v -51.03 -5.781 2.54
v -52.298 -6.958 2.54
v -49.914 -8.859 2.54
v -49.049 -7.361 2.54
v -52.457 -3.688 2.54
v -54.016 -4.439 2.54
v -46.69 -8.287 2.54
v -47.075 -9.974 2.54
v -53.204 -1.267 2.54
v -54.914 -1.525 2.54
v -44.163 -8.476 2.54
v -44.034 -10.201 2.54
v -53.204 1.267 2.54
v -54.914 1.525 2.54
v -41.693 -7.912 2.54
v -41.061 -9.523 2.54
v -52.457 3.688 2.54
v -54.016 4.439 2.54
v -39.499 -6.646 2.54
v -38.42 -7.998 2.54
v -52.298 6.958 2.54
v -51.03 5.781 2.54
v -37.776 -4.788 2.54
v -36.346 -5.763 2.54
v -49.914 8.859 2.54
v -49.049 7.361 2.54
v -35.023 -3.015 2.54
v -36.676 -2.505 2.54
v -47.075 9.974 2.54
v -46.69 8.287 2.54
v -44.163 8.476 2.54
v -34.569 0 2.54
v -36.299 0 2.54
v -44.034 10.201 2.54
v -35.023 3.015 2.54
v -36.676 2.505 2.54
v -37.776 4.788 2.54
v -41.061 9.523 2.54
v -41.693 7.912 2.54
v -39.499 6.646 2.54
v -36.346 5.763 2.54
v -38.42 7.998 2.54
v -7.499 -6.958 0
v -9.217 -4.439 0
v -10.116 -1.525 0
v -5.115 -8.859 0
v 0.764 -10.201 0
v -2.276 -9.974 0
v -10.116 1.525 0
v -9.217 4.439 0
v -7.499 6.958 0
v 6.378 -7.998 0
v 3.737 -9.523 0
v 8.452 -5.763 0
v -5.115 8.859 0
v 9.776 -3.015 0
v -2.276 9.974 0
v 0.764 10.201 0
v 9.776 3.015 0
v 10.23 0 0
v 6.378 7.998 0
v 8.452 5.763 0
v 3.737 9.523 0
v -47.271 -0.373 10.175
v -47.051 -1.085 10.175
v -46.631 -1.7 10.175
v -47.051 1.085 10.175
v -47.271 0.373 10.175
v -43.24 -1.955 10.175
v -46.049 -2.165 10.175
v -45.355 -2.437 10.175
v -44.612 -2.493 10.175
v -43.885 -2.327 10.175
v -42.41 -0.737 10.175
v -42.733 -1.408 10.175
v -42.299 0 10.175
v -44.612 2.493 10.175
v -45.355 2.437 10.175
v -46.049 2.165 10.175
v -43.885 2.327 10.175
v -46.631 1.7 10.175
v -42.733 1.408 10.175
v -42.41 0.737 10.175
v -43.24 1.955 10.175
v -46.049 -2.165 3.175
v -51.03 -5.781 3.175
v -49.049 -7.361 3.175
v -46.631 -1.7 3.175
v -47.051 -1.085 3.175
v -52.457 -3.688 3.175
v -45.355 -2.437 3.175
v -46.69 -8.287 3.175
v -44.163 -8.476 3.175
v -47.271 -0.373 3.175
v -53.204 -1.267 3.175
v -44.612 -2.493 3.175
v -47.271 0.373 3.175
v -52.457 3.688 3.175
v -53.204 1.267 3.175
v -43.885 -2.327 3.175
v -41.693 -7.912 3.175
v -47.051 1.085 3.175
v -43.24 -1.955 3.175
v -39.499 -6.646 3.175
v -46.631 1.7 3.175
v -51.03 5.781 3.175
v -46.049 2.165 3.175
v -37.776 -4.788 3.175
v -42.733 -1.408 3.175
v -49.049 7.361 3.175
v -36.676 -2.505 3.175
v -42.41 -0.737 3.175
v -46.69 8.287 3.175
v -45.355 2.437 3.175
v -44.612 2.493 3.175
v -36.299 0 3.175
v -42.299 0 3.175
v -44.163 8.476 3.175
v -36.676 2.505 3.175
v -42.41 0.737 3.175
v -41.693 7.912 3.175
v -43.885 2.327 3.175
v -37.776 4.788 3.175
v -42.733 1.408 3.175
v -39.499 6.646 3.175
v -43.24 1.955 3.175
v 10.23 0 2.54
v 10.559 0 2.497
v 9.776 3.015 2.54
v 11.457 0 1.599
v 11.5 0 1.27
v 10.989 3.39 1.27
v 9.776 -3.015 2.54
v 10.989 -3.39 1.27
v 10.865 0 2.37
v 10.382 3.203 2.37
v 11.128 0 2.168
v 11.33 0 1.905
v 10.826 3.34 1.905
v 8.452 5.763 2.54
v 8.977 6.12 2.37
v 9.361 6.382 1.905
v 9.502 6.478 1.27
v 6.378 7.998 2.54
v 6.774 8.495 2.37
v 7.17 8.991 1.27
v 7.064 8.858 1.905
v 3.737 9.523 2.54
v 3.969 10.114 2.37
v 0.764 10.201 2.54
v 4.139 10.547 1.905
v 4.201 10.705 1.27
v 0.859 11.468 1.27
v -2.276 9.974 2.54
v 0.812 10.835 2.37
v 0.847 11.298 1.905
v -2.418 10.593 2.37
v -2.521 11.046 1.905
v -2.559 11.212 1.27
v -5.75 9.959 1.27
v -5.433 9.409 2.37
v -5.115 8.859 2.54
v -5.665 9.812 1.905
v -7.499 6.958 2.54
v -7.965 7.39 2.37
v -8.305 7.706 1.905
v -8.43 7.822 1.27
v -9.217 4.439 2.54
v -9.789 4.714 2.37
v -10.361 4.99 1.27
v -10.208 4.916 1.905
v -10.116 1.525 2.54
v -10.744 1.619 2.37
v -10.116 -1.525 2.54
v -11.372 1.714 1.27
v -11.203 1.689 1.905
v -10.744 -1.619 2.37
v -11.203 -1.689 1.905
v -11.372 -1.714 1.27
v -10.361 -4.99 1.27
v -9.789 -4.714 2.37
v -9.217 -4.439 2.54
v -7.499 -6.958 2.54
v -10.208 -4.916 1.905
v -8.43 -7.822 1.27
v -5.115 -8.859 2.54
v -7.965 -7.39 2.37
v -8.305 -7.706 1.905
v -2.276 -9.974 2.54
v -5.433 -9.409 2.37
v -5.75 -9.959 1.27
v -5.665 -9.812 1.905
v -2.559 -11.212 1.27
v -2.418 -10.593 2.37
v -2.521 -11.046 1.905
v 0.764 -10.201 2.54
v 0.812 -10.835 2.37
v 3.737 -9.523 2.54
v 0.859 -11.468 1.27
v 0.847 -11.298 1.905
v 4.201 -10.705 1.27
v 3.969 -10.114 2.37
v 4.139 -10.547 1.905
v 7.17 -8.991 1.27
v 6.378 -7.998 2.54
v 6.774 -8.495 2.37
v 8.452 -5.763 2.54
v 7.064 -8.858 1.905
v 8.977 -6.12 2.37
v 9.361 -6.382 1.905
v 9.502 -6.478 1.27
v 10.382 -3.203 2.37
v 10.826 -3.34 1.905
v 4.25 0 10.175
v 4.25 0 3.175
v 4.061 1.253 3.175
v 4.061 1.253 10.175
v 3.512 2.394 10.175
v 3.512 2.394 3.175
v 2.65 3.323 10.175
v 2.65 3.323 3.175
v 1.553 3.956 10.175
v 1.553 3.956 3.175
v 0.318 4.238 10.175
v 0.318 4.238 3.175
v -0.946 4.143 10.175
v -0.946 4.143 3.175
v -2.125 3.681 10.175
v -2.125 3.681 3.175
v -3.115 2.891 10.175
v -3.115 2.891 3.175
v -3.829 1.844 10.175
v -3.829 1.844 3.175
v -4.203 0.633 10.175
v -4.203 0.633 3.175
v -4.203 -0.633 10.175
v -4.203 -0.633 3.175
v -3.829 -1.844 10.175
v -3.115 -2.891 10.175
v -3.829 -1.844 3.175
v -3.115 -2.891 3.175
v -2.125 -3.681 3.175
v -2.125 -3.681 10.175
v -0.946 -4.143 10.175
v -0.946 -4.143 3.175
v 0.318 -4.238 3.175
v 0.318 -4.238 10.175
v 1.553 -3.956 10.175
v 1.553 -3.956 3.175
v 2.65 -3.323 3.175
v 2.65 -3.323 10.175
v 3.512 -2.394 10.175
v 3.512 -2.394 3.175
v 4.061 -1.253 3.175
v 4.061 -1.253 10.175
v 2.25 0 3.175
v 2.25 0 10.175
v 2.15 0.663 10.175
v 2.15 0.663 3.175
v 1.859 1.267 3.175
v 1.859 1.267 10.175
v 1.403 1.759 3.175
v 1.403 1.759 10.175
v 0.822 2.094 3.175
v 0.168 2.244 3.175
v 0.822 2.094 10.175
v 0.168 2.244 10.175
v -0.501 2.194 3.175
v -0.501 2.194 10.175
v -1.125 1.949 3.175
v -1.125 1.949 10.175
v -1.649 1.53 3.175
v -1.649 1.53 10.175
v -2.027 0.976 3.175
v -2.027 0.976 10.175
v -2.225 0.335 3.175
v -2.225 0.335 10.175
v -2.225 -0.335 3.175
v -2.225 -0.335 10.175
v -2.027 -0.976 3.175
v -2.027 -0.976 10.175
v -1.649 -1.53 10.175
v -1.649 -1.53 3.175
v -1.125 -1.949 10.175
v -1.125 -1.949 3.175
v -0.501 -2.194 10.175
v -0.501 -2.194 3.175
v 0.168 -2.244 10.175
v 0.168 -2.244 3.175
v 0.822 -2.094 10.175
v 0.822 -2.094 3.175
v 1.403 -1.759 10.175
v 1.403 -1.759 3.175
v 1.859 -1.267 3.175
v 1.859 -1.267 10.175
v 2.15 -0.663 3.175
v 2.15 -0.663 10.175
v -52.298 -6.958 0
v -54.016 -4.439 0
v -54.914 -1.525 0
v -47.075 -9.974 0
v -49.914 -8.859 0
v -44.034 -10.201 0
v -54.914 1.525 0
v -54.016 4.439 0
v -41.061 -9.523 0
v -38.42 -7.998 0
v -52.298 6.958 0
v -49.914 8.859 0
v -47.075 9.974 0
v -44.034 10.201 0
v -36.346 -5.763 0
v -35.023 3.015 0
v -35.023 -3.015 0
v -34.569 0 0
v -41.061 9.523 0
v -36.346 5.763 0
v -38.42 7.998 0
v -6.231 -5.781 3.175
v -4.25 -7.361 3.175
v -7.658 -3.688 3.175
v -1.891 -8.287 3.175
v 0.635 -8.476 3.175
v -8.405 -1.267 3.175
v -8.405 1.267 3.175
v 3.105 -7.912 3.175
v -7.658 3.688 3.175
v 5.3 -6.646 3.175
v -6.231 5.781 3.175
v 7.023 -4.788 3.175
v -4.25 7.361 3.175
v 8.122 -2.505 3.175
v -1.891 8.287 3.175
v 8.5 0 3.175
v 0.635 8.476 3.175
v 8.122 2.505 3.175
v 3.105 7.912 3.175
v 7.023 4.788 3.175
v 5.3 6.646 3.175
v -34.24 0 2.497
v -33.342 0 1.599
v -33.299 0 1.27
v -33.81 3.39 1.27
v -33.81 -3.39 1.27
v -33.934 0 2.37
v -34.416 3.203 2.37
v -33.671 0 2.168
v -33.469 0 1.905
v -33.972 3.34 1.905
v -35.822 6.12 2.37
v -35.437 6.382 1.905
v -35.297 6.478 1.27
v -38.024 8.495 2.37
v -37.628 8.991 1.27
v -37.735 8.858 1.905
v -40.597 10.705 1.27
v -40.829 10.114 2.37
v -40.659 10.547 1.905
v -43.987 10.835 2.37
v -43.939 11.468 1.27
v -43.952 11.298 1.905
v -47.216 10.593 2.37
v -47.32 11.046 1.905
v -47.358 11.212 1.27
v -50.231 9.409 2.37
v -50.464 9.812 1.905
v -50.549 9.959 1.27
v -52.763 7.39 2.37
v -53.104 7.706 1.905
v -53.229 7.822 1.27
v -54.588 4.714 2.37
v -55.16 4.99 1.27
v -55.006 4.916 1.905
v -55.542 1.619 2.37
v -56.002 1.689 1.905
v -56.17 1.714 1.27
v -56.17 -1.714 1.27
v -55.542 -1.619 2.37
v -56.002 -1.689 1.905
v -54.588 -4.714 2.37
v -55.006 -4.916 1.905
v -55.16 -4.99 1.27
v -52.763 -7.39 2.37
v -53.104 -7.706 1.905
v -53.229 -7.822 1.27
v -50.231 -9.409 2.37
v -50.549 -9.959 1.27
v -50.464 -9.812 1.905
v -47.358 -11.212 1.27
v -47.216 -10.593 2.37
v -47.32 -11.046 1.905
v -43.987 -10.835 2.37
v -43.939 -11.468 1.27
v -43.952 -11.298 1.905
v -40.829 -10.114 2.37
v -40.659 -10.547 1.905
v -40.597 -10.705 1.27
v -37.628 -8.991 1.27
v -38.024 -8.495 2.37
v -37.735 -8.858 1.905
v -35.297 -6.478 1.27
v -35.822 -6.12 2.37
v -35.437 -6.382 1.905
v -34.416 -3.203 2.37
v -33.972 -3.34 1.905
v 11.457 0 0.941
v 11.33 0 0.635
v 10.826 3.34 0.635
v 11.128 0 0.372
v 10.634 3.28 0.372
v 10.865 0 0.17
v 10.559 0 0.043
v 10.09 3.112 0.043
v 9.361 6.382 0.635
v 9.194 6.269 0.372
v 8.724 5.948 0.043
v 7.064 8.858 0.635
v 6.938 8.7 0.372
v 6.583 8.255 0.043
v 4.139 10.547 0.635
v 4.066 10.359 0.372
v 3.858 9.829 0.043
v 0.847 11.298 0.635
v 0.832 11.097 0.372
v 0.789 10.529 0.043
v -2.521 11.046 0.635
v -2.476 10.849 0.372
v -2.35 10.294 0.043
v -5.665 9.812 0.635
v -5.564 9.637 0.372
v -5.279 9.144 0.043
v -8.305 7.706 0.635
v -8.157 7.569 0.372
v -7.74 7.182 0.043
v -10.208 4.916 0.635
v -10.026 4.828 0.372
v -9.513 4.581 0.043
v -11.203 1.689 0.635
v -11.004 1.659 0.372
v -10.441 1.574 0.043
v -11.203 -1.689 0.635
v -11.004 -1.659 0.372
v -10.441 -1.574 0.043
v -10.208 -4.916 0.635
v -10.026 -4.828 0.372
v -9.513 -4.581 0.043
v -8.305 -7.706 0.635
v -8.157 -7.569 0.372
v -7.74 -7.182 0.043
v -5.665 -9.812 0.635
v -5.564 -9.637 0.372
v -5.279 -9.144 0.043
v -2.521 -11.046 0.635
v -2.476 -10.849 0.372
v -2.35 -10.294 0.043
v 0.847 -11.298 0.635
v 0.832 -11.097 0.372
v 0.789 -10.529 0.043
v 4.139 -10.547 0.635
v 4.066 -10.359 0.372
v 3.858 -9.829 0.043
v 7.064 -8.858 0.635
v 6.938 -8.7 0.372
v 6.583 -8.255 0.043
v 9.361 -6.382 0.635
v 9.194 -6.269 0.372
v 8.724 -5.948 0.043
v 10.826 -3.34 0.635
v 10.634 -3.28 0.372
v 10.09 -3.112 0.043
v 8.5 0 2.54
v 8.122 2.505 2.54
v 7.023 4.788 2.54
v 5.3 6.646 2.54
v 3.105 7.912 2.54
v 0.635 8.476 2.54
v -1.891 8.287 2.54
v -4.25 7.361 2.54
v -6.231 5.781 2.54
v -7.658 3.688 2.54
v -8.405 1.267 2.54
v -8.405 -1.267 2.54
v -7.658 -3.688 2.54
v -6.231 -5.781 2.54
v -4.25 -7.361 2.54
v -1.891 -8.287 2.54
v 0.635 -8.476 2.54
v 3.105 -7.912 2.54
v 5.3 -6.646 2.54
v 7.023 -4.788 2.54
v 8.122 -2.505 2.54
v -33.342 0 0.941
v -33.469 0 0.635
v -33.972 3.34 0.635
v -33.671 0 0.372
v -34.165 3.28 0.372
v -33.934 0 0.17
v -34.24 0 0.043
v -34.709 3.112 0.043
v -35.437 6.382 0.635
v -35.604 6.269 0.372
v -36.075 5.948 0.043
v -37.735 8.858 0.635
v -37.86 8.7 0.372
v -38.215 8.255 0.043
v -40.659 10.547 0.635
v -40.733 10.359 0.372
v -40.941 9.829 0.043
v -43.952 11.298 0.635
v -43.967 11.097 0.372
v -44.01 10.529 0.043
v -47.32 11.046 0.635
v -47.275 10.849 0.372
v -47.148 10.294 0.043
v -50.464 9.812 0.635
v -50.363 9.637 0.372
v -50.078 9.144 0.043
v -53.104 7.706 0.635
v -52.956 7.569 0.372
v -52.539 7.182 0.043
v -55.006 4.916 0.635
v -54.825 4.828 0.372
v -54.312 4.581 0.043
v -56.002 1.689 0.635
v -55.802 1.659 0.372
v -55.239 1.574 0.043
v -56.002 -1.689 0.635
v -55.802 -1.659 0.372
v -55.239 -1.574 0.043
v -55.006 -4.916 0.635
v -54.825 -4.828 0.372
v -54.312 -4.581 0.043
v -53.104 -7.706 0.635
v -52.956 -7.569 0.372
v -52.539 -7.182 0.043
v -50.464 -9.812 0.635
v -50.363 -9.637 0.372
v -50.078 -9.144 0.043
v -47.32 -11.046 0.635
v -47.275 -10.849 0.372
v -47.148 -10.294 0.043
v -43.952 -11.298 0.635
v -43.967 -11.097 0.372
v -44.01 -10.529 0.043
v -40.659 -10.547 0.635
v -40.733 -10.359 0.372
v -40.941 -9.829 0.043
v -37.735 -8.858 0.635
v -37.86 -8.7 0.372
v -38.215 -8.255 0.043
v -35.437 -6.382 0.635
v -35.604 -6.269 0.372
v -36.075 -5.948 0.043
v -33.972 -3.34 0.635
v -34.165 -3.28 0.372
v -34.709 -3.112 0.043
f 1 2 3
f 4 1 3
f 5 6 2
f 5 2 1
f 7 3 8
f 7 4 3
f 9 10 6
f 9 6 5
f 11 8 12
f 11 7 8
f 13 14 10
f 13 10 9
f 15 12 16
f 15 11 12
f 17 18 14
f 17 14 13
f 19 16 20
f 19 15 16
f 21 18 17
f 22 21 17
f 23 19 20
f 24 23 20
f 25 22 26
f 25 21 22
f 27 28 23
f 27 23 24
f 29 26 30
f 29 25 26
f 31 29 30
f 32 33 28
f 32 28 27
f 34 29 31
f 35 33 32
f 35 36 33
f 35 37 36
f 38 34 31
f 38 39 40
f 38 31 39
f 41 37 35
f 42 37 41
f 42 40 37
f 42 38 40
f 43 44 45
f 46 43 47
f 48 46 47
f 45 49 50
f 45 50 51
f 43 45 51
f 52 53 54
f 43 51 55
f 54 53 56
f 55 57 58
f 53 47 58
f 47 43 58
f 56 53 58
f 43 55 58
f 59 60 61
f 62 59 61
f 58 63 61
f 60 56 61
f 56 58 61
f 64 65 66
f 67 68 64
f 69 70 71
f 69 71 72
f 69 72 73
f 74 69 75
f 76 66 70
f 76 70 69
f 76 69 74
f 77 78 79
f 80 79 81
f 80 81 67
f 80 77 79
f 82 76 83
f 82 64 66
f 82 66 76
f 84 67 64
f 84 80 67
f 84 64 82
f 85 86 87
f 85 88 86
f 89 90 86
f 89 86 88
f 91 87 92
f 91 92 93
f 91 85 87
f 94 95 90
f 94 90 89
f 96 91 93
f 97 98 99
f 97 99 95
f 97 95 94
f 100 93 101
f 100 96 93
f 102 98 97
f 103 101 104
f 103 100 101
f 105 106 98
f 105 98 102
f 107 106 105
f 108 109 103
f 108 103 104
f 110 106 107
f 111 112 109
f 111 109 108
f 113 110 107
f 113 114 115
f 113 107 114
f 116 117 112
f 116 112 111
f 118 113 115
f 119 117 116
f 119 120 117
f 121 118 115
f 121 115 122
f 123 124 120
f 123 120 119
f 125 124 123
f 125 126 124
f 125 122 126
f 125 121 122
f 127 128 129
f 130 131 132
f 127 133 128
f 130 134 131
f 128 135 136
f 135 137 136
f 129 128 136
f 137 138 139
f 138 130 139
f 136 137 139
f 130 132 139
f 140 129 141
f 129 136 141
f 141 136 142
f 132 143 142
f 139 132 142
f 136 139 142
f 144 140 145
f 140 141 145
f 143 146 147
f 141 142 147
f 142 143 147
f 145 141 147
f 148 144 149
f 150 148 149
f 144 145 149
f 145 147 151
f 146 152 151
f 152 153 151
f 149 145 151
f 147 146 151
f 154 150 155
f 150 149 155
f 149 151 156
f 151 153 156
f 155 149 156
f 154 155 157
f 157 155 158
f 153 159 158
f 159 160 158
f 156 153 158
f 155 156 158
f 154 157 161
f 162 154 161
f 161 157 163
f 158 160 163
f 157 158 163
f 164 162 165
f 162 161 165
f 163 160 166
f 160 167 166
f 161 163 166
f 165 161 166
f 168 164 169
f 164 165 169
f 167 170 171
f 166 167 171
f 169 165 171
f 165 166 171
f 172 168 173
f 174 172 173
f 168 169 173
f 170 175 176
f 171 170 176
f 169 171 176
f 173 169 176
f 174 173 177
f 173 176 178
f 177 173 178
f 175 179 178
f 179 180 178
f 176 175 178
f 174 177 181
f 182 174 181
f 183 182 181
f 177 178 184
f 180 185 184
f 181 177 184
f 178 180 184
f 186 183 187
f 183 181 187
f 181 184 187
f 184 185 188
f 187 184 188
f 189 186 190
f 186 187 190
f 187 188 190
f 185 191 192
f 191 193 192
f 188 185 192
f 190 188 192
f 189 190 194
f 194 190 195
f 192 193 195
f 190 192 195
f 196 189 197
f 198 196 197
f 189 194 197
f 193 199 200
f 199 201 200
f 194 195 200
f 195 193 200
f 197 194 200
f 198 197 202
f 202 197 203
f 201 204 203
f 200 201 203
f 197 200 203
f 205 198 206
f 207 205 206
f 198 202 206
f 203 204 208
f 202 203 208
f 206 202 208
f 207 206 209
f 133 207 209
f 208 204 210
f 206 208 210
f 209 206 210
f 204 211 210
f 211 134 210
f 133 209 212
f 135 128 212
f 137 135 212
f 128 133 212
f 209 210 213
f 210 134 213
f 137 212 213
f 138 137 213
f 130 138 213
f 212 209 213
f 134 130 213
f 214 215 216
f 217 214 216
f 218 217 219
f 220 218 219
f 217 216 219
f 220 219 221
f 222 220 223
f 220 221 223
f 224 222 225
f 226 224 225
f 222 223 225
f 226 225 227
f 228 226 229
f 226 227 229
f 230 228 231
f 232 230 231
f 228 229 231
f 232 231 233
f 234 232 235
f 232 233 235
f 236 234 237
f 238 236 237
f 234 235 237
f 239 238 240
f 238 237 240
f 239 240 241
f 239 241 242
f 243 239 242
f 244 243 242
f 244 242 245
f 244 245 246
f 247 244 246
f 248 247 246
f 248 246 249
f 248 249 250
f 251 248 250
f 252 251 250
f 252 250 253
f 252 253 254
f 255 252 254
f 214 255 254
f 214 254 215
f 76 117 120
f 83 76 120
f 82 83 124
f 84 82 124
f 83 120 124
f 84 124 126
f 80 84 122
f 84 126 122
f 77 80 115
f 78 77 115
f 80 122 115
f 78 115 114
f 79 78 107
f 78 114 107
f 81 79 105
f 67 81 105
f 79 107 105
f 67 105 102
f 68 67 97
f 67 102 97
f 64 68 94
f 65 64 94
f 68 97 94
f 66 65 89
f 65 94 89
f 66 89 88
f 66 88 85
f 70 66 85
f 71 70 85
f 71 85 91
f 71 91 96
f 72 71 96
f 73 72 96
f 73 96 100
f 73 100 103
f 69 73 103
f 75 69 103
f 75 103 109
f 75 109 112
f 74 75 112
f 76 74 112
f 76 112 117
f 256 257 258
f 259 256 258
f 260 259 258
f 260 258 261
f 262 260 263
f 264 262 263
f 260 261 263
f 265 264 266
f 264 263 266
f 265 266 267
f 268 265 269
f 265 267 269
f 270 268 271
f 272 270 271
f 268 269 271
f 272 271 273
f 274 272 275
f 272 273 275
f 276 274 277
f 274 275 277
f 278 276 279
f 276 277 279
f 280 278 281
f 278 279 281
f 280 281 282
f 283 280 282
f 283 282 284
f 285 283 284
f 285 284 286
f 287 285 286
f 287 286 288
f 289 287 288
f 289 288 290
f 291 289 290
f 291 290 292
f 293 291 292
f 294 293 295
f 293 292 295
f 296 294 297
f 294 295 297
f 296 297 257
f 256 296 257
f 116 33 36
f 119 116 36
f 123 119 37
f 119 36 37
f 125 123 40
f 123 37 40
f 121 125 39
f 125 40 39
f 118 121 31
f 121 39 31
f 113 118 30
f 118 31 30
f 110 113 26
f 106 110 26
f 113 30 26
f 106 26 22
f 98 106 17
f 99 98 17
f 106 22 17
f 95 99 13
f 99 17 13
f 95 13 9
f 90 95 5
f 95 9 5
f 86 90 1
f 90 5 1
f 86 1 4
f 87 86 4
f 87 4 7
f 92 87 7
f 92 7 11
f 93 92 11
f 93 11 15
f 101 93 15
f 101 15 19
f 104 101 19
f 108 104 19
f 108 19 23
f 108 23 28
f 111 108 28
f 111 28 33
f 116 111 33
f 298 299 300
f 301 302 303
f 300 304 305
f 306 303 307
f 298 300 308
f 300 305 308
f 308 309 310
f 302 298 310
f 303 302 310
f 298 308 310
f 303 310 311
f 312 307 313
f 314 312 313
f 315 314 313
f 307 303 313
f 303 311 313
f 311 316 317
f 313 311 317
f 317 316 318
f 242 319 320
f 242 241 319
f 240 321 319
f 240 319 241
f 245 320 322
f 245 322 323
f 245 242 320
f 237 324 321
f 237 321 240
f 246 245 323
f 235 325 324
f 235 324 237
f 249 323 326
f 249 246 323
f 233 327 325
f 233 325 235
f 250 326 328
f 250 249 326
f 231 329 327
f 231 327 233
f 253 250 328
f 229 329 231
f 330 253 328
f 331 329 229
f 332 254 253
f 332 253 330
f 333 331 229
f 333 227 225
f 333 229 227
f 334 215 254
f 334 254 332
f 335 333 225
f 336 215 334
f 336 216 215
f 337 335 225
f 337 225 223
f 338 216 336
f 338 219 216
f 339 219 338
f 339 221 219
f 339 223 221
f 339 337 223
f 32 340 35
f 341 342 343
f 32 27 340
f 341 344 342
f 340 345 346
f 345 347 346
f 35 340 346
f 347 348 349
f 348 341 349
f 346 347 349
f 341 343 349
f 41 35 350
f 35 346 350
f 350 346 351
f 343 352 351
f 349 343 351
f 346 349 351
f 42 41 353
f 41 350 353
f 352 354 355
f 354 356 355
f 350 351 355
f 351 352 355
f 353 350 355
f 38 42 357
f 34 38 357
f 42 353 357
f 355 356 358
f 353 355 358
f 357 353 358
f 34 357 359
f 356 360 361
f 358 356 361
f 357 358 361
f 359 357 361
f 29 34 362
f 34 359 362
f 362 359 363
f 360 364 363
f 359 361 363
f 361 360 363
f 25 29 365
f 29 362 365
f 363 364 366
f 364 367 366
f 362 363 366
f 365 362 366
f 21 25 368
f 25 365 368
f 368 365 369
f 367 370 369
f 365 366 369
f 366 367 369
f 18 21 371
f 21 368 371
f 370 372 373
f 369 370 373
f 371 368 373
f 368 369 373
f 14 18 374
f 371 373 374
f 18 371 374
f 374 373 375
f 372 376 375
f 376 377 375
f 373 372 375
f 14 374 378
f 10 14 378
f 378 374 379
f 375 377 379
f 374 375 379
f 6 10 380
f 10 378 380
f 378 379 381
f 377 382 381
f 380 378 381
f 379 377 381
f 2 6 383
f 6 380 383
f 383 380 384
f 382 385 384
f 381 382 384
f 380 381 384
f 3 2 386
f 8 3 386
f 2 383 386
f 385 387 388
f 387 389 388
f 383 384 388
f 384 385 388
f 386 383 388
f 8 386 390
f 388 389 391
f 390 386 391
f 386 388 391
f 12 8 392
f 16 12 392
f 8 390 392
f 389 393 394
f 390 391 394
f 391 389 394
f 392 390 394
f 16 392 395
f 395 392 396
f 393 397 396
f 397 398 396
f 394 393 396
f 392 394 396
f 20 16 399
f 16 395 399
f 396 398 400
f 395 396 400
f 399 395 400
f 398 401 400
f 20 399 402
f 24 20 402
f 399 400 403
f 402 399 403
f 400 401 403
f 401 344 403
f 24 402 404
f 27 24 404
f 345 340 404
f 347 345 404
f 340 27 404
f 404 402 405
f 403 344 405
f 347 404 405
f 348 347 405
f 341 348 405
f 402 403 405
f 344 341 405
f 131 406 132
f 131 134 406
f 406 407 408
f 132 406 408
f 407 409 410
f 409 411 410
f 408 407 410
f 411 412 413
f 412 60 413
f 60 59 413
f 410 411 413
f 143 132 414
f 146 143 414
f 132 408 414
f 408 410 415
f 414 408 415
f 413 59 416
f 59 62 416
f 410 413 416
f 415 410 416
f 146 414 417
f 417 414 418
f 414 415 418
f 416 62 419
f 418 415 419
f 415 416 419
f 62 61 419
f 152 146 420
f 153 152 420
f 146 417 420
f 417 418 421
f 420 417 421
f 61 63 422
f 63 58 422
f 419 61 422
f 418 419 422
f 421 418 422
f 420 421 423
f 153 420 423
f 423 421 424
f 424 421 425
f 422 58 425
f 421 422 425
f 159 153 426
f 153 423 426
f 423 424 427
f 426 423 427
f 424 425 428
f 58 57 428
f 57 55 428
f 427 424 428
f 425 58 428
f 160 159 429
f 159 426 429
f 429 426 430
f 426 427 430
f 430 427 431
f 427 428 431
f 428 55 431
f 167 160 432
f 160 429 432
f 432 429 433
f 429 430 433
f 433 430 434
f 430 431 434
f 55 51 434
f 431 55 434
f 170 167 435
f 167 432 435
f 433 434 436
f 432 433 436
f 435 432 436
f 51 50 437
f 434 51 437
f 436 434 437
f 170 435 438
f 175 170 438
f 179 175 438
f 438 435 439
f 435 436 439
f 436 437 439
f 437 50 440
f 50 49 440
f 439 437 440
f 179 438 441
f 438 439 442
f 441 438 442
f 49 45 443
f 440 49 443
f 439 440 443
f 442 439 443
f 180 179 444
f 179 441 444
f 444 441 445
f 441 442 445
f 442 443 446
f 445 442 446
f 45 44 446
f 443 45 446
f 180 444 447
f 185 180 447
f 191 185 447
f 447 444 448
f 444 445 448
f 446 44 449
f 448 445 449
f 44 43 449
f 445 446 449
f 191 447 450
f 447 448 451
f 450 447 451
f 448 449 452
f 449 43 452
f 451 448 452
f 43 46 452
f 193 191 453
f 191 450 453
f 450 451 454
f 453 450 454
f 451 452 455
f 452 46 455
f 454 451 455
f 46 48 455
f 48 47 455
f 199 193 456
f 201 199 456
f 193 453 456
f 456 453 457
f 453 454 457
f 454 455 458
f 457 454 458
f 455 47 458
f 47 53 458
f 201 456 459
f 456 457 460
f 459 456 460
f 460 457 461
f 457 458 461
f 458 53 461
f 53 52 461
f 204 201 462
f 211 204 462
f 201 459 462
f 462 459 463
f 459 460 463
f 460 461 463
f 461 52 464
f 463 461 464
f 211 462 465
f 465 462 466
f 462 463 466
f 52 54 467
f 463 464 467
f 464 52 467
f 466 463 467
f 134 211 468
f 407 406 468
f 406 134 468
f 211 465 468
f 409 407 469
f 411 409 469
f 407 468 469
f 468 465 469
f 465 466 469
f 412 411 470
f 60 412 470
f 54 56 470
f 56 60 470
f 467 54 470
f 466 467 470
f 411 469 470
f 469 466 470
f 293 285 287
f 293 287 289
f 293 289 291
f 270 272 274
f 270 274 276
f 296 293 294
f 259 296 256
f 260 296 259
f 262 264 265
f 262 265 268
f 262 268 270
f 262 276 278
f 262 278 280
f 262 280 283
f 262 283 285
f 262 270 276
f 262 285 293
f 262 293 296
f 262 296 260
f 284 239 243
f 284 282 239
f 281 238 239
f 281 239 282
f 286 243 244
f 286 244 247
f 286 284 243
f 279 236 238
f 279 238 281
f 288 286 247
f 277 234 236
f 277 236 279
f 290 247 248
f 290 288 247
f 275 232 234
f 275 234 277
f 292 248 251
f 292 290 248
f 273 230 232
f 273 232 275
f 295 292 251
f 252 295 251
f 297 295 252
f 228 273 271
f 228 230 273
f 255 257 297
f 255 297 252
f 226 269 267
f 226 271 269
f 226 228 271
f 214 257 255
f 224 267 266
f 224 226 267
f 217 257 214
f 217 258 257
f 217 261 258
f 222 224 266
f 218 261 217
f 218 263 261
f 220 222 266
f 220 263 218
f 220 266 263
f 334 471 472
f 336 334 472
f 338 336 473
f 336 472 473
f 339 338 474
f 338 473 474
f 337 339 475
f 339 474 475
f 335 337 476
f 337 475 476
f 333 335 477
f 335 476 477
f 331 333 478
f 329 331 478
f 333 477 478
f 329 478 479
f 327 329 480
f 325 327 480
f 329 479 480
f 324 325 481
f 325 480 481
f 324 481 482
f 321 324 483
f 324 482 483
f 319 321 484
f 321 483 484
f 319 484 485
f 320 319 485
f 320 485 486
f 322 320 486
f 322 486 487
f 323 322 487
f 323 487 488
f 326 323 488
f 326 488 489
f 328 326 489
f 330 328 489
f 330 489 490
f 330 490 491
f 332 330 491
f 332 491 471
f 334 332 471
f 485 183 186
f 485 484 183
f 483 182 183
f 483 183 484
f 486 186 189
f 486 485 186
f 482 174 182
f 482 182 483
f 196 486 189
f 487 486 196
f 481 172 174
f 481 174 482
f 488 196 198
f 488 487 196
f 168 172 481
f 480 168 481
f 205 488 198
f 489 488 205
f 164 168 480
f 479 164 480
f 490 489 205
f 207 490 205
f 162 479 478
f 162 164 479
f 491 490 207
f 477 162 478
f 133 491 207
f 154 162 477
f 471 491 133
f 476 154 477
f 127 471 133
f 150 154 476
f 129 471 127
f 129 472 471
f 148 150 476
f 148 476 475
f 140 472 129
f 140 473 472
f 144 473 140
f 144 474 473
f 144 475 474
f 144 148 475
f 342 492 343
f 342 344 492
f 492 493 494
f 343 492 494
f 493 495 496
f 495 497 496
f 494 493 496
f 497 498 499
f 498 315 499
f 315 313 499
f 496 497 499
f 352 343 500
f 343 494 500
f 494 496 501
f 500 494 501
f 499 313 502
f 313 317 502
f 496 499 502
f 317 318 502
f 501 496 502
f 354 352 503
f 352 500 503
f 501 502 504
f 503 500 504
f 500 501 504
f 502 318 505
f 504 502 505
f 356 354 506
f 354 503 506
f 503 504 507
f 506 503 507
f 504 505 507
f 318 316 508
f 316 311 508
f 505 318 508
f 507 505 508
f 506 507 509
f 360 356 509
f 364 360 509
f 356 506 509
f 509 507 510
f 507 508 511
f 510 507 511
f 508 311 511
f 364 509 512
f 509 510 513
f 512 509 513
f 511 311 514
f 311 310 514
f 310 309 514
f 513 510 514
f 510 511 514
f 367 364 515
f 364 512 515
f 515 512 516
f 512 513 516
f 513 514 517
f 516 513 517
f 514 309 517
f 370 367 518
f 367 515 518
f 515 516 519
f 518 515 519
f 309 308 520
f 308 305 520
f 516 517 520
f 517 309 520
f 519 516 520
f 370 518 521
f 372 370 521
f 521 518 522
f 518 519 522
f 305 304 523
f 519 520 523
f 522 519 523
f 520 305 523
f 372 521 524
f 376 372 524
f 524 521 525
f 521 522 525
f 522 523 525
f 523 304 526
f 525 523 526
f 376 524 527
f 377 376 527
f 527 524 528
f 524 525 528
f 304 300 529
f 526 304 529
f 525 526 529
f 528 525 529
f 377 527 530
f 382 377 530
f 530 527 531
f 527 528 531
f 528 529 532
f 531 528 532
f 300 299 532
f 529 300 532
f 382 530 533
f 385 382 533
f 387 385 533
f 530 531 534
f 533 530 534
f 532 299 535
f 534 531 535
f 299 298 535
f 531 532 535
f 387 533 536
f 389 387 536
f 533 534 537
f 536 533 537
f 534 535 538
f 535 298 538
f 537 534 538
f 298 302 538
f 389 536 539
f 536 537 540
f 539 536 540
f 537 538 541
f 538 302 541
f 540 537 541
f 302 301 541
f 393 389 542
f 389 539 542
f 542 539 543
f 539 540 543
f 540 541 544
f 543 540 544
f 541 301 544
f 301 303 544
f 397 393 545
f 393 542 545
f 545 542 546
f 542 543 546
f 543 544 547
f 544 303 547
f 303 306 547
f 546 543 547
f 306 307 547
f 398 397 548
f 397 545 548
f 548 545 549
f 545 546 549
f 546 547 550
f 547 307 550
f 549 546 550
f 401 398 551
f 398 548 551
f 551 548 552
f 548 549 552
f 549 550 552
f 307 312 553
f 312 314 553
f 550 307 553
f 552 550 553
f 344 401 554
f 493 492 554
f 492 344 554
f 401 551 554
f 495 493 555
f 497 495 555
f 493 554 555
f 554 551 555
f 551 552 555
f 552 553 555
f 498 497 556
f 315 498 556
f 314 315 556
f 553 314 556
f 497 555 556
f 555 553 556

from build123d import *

# Parameters (mm, degrees)
F0_R      = 11.5
F0_R_2    = 8.5
F1_DEPTH  = 2.54
F0_R_3    = 4.25
F2_DEPTH  = 3.175
F3_DEPTH  = 10.175
F4_R      = 1.26999
F5_R      = 11.5
F5_R_2    = 8.5
F6_DEPTH  = 2.54
F5_R_3    = 2.5
F7_DEPTH  = 3.175
F8_DEPTH  = 10.175
F9_R      = 2.25
F10_DEPTH = 7
F11_R     = 1.26999


# Not quite as in the source:
# - a fillet or chamfer is up to 0.001 mm smaller than in the source, because OpenCascade refuses the exact size


with BuildPart() as f1:
    # F0 (on Top) → F1 (new body)
    with BuildSketch(Plane.XY):
        Circle(F0_R)
        Circle(F0_R_2, mode=Mode.SUBTRACT)
    extrude(amount=F1_DEPTH)

    # F0 (on Top) → F2 (join)
    with BuildSketch(Plane.XY):
        Circle(F0_R_2)
        Circle(F0_R_3, mode=Mode.SUBTRACT)
    extrude(amount=F2_DEPTH)

    # F0 (on Top) → F3 (join)
    with BuildSketch(Plane.XY):
        Circle(F0_R_3)
    extrude(amount=F3_DEPTH)

    # F4 (radius 1.27 in the source; OpenCascade refuses exactly that, so slightly less here)
    f4_edges = [f1.edges().sort_by_distance(p)[0] for p in [
        (-11.5, 0, 2.54),
        (-11.5, 0, 0),
    ]]
    fillet(f4_edges, radius=F4_R)

    # F9 (on face) → F10 (cut)
    with BuildSketch(Plane.XY.offset(10.175)):
        Circle(F9_R)
    extrude(amount=-F10_DEPTH, mode=Mode.SUBTRACT)


with BuildPart() as f6:
    # F5 (on Top) → F6 (new body)
    with BuildSketch(Plane.XY):
        with Locations((-44.7985892718, 0)):
            Circle(F5_R)
        with Locations((-44.7985892718, 0)):
            Circle(F5_R_2, mode=Mode.SUBTRACT)
    extrude(amount=F6_DEPTH)

    # F5 (on Top) → F7 (join)
    with BuildSketch(Plane.XY):
        with Locations((-44.7985892718, 0)):
            Circle(F5_R_2)
        with Locations((-44.7985892718, 0)):
            Circle(F5_R_3, mode=Mode.SUBTRACT)
    extrude(amount=F7_DEPTH)

    # F5 (on Top) → F8 (join)
    with BuildSketch(Plane.XY):
        with Locations((-44.7985892718, 0)):
            Circle(F5_R_3)
    extrude(amount=F8_DEPTH)

    # F11 (radius 1.27 in the source; OpenCascade refuses exactly that, so slightly less here)
    f11_edges = [f6.edges().sort_by_distance(p)[0] for p in [
        (-56.298589, 0, 2.54),
        (-56.298589, 0, 0),
    ]]
    fillet(f11_edges, radius=F11_R)


solid = Compound([f1.part, f6.part])
